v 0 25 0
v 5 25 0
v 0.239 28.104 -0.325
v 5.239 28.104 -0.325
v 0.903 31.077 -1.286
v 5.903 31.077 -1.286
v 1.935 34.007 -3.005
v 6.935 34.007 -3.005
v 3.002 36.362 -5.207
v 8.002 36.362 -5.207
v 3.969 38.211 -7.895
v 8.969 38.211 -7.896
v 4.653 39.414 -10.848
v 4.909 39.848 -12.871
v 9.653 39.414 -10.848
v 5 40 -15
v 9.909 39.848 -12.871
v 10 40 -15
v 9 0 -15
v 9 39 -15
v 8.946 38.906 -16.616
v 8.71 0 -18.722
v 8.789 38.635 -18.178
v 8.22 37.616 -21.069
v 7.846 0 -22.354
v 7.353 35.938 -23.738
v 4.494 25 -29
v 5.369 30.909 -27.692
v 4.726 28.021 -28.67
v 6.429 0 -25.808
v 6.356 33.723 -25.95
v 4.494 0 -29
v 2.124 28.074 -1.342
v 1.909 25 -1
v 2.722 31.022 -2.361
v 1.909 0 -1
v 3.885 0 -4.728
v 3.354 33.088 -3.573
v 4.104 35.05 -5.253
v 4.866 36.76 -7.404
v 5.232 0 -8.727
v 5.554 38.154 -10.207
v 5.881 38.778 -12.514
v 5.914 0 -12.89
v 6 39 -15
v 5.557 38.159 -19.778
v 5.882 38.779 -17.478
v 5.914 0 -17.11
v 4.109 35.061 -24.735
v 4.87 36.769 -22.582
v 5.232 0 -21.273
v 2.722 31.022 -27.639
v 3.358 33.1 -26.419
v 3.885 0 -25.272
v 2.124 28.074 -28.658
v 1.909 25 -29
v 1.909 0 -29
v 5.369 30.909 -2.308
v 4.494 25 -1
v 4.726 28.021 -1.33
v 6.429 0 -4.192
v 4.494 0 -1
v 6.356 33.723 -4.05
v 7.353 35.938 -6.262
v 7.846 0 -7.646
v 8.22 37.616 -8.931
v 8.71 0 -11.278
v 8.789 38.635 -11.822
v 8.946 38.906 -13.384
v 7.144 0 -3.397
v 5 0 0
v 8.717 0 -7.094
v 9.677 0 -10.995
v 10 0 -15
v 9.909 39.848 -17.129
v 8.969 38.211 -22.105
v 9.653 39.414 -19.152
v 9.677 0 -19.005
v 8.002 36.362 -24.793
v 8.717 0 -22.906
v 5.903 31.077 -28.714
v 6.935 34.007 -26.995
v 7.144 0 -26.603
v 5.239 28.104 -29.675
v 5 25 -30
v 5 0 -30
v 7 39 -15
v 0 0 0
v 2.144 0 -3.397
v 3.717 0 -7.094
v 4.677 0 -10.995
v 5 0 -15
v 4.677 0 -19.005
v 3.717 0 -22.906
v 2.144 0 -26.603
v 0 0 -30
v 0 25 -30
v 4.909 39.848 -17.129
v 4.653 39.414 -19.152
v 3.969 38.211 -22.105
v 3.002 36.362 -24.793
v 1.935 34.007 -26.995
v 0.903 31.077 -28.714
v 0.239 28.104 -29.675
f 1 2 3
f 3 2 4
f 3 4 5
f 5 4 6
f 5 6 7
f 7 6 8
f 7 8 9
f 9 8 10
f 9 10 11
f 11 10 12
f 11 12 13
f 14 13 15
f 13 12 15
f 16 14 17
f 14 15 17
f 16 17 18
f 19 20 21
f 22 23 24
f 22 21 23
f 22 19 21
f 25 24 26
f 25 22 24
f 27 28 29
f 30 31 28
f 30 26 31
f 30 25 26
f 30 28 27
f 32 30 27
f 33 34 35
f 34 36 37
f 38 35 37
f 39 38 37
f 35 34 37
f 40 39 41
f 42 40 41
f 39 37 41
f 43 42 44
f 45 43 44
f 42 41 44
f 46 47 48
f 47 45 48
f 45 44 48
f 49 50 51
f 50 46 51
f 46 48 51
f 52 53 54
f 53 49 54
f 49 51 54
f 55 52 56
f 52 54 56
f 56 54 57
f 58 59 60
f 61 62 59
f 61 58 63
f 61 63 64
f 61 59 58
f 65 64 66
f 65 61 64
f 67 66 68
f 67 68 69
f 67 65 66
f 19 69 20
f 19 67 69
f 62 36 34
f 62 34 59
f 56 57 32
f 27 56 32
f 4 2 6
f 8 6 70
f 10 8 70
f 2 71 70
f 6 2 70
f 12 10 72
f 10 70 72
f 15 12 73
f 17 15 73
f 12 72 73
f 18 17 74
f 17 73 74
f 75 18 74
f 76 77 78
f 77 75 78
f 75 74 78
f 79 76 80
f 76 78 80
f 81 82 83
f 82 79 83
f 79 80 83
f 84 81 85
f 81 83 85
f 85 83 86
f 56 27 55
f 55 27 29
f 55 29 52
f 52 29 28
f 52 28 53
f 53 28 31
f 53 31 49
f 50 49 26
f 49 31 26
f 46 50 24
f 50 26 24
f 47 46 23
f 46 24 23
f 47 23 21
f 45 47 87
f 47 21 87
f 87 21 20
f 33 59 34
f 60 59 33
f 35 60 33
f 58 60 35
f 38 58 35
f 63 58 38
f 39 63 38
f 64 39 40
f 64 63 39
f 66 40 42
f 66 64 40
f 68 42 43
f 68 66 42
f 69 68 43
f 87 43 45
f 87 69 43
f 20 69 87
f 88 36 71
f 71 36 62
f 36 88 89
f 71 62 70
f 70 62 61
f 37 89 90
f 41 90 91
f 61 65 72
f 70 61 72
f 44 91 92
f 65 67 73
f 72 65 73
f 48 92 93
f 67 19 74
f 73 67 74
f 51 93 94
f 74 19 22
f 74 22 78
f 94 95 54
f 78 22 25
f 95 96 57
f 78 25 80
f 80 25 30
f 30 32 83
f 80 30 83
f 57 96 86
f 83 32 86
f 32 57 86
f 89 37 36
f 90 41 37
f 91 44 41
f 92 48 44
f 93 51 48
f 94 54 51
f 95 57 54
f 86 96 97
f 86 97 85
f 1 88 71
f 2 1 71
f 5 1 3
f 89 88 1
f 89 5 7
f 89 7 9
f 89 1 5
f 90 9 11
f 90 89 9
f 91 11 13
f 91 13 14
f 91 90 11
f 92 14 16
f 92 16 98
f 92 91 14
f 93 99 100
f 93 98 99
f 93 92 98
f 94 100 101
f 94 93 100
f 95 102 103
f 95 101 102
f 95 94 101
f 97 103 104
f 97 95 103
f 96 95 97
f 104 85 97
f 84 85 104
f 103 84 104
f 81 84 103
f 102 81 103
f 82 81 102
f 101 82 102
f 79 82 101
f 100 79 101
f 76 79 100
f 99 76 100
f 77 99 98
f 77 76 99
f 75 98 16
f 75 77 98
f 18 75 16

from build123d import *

# Parameters (mm, degrees)
SKETCH1_W           = 10
SKETCH1_H           = 30
BOSS_EXTRUDE1_DEPTH = 40
FILLET1_R           = 15
CUT_EXTRUDE1_DEPTH  = 40
SHELL2_T            = -1


with BuildPart() as part:
    # Sketch1 → Boss-Extrude1 (new body)
    with BuildSketch(Plane(origin=(0, 0, 0), x_dir=(1, 0, 0), z_dir=(0, 1, 0))):
        with Locations((5, 15)):
            Rectangle(SKETCH1_W, SKETCH1_H)
    extrude(amount=BOSS_EXTRUDE1_DEPTH)

    # Fillet1
    fillet1_edges = [part.edges().sort_by_distance(p)[0] for p in [
        (5, 40, -30),
        (5, 40, 0),
    ]]
    fillet(fillet1_edges, radius=FILLET1_R - 0.0001)  # a hair under: the kernel refuses the full size

    # Sketch2 → Cut-Extrude1 (cut)
    with BuildSketch(Plane.XZ):
        with BuildLine():
            Line((10, 0), (5, 0))
            ThreePointArc((5, 0), (8.717082451, -7.09430585), (10, -15))
            Line((10, -15), (10, 0))
        make_face()
        with BuildLine():
            Line((10, -30), (10, -15))
            ThreePointArc((10, -15), (8.717082451, -22.90569415), (5, -30))
            Line((5, -30), (10, -30))
        make_face()
        with BuildLine():
            ThreePointArc((0, 0), (5, -15), (0, -30))
            Line((0, -30), (0, 0))
        make_face()
    extrude(amount=-CUT_EXTRUDE1_DEPTH, mode=Mode.SUBTRACT)

    # Shell2
    shell2_openings = [part.faces().sort_by_distance(p)[0] for p in [
        (5.9062731, 0, -15),
    ]]
    offset(amount=SHELL2_T, openings=shell2_openings)


solid = part.part
